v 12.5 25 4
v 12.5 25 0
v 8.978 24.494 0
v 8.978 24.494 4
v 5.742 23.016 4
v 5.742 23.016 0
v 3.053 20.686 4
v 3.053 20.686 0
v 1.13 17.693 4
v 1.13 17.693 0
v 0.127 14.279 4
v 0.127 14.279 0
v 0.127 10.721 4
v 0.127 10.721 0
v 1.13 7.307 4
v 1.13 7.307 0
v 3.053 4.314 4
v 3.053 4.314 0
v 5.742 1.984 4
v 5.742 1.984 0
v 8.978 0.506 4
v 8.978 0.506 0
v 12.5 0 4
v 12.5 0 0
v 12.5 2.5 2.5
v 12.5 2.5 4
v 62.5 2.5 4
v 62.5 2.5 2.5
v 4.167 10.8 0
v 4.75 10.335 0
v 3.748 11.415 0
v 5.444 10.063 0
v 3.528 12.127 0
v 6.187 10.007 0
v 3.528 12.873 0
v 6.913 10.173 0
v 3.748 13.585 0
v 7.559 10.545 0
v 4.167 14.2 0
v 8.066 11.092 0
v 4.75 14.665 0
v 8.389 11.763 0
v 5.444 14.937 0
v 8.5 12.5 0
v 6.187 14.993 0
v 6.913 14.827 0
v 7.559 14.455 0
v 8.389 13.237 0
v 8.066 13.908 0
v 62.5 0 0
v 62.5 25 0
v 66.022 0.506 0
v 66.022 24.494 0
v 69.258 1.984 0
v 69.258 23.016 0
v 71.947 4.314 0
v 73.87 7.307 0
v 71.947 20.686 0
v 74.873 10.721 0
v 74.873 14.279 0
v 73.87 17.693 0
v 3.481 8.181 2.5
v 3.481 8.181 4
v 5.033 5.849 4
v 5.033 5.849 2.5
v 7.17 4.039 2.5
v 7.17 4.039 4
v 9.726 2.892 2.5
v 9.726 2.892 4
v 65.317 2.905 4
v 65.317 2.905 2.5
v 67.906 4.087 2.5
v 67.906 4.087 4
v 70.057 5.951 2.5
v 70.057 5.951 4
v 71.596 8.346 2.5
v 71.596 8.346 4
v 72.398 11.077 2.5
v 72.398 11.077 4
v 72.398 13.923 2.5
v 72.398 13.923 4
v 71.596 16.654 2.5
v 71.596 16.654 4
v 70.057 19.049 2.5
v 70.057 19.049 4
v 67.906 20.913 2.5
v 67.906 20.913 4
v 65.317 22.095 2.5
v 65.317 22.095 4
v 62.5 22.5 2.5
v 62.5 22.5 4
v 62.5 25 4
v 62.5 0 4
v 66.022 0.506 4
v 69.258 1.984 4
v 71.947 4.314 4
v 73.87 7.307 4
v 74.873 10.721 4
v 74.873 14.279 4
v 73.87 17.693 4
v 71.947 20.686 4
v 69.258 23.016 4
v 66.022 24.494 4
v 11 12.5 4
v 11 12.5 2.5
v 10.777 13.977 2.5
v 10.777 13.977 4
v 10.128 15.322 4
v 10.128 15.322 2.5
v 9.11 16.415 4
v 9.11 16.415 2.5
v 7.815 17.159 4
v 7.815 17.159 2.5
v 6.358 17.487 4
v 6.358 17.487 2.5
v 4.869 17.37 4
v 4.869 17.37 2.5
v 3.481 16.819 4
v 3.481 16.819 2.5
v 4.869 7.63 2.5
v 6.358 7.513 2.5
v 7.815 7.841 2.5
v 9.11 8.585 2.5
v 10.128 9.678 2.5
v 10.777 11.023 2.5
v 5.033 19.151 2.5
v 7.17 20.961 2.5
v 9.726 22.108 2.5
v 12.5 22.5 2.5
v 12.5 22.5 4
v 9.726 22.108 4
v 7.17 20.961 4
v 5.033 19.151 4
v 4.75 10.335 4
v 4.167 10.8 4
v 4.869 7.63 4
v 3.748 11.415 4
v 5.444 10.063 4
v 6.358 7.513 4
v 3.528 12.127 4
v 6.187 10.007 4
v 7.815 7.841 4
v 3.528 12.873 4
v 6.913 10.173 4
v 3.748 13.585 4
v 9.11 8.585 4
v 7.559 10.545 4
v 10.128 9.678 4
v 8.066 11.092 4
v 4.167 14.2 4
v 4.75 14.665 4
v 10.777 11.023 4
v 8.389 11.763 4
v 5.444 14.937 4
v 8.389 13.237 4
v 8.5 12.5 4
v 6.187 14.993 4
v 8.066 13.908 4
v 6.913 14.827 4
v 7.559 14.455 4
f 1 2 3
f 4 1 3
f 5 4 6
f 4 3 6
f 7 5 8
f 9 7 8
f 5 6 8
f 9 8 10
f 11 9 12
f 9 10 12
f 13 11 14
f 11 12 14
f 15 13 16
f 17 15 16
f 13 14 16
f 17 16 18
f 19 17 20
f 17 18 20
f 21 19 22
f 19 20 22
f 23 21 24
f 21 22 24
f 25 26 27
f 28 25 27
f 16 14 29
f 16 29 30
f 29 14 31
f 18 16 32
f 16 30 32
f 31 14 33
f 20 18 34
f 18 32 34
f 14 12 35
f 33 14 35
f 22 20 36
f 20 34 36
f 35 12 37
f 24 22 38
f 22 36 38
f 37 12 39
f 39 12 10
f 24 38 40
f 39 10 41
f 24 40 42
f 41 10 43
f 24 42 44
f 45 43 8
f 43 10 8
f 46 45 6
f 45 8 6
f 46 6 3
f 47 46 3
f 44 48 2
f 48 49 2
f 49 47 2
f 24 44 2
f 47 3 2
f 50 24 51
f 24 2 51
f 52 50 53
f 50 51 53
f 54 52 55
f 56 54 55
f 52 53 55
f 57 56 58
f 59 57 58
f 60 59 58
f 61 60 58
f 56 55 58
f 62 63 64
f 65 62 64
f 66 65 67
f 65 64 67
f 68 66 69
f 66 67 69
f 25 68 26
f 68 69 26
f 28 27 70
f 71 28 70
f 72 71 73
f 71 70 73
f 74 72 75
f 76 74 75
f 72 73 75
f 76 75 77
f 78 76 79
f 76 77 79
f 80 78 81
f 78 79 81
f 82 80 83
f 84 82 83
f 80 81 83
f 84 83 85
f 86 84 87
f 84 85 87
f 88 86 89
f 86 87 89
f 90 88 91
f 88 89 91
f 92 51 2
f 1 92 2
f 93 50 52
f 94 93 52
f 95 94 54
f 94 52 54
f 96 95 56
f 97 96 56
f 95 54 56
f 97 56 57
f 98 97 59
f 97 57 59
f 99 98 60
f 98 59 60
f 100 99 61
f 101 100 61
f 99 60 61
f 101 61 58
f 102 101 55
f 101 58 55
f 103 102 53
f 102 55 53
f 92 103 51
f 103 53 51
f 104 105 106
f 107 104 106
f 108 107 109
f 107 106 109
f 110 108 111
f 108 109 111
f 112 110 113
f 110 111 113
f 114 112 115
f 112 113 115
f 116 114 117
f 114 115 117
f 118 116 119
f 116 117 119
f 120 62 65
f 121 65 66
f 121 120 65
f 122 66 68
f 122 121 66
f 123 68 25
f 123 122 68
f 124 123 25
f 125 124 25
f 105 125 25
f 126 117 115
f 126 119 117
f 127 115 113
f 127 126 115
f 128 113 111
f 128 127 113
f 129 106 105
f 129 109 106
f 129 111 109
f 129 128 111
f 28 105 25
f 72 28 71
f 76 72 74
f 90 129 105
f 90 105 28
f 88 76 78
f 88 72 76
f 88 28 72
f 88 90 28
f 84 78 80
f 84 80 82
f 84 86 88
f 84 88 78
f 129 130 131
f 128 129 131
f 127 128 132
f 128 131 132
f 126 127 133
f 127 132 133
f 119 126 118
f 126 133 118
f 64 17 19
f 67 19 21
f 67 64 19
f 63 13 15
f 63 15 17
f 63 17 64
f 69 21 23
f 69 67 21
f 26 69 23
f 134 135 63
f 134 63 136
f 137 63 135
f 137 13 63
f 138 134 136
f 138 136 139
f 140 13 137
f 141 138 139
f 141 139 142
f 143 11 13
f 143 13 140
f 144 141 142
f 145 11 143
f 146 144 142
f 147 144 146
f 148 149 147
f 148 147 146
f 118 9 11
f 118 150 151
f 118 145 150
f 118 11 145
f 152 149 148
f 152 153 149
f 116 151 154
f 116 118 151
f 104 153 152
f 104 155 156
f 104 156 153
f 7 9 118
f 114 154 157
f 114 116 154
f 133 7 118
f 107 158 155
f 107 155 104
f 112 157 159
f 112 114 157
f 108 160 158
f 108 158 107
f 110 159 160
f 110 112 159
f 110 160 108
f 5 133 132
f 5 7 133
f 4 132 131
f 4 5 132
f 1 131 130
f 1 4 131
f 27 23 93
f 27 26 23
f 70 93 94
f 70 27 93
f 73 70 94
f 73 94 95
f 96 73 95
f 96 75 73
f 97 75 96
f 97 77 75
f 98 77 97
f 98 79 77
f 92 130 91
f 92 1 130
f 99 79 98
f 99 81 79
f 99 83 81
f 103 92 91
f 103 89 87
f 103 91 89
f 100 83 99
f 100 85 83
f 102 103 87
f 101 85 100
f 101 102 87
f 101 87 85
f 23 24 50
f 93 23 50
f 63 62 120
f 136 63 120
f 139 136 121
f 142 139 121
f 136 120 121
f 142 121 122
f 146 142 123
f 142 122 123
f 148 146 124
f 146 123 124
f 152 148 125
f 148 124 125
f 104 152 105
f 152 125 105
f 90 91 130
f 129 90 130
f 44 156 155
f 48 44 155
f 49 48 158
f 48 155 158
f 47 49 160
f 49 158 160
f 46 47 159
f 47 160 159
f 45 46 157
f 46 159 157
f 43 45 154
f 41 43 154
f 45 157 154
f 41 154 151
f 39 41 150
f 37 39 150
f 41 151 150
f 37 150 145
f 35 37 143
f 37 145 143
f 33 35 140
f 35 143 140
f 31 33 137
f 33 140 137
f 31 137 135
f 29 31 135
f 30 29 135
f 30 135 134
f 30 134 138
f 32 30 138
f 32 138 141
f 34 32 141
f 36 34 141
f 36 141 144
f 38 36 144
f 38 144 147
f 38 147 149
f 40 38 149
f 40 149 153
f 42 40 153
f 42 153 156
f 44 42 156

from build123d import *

# Parameters (mm, degrees)
F1_DEPTH = 4
F3_DEPTH = 1.5
F5_DEPTH = 1.5
F6_DEPTH = 1.5
F7_R     = 2.5
F8_DEPTH = 25


with BuildPart() as f1:
    # F0 (on Top) → F1 (new body)
    with BuildSketch(Plane.XY):
        with BuildLine():
            ThreePointArc((12.5, 25), (0, 12.5), (12.5, 0))
            Line((12.5, 0), (62.5, 0))
            ThreePointArc((62.5, 0), (75, 12.5), (62.5, 25))
            Line((62.5, 25), (12.5, 25))
        make_face()
    extrude(amount=F1_DEPTH)

    # F2 (on face) → F3 (cut)
    with BuildSketch(Plane.XY.offset(4)):
        with BuildLine():
            Line((62.5, 22.5), (12.5, 22.5))
            ThreePointArc((12.5, 22.5), (2.5, 12.5), (12.5, 2.5))
            Line((12.5, 2.5), (62.5, 2.5))
            ThreePointArc((62.5, 2.5), (72.5, 12.5), (62.5, 22.5))
        make_face()
    extrude(amount=-F3_DEPTH, mode=Mode.SUBTRACT)

    # F4 (on face) → F5 (join)
    with BuildSketch(Plane.XY.offset(2.5)):
        with BuildLine():
            ThreePointArc((3.4807692308, 8.1810329555), (2.5, 12.5), (3.4807692308, 16.8189670445))
            ThreePointArc((3.4807692308, 16.8189670445), (1, 12.5), (3.4807692308, 8.1810329555))
        make_face()
    extrude(amount=F5_DEPTH)

    # F4 (on face) → F6 (join)
    with BuildSketch(Plane.XY.offset(2.5)):
        with BuildLine():
            ThreePointArc((3.4807692308, 8.1810329555), (8.4903660528, 8.1643250902), (11, 12.5))
            ThreePointArc((11, 12.5), (8.4903660528, 16.8356749098), (3.4807692308, 16.8189670445))
            ThreePointArc((3.4807692308, 16.8189670445), (2.5, 12.5), (3.4807692308, 8.1810329555))
        make_face()
    extrude(amount=F6_DEPTH)

    # F7 (on face) → F8 (cut)
    with BuildSketch(Plane.XY.offset(4)):
        with Locations((6, 12.5)):
            Circle(F7_R)
    extrude(amount=-F8_DEPTH, mode=Mode.SUBTRACT)


solid = f1.part
